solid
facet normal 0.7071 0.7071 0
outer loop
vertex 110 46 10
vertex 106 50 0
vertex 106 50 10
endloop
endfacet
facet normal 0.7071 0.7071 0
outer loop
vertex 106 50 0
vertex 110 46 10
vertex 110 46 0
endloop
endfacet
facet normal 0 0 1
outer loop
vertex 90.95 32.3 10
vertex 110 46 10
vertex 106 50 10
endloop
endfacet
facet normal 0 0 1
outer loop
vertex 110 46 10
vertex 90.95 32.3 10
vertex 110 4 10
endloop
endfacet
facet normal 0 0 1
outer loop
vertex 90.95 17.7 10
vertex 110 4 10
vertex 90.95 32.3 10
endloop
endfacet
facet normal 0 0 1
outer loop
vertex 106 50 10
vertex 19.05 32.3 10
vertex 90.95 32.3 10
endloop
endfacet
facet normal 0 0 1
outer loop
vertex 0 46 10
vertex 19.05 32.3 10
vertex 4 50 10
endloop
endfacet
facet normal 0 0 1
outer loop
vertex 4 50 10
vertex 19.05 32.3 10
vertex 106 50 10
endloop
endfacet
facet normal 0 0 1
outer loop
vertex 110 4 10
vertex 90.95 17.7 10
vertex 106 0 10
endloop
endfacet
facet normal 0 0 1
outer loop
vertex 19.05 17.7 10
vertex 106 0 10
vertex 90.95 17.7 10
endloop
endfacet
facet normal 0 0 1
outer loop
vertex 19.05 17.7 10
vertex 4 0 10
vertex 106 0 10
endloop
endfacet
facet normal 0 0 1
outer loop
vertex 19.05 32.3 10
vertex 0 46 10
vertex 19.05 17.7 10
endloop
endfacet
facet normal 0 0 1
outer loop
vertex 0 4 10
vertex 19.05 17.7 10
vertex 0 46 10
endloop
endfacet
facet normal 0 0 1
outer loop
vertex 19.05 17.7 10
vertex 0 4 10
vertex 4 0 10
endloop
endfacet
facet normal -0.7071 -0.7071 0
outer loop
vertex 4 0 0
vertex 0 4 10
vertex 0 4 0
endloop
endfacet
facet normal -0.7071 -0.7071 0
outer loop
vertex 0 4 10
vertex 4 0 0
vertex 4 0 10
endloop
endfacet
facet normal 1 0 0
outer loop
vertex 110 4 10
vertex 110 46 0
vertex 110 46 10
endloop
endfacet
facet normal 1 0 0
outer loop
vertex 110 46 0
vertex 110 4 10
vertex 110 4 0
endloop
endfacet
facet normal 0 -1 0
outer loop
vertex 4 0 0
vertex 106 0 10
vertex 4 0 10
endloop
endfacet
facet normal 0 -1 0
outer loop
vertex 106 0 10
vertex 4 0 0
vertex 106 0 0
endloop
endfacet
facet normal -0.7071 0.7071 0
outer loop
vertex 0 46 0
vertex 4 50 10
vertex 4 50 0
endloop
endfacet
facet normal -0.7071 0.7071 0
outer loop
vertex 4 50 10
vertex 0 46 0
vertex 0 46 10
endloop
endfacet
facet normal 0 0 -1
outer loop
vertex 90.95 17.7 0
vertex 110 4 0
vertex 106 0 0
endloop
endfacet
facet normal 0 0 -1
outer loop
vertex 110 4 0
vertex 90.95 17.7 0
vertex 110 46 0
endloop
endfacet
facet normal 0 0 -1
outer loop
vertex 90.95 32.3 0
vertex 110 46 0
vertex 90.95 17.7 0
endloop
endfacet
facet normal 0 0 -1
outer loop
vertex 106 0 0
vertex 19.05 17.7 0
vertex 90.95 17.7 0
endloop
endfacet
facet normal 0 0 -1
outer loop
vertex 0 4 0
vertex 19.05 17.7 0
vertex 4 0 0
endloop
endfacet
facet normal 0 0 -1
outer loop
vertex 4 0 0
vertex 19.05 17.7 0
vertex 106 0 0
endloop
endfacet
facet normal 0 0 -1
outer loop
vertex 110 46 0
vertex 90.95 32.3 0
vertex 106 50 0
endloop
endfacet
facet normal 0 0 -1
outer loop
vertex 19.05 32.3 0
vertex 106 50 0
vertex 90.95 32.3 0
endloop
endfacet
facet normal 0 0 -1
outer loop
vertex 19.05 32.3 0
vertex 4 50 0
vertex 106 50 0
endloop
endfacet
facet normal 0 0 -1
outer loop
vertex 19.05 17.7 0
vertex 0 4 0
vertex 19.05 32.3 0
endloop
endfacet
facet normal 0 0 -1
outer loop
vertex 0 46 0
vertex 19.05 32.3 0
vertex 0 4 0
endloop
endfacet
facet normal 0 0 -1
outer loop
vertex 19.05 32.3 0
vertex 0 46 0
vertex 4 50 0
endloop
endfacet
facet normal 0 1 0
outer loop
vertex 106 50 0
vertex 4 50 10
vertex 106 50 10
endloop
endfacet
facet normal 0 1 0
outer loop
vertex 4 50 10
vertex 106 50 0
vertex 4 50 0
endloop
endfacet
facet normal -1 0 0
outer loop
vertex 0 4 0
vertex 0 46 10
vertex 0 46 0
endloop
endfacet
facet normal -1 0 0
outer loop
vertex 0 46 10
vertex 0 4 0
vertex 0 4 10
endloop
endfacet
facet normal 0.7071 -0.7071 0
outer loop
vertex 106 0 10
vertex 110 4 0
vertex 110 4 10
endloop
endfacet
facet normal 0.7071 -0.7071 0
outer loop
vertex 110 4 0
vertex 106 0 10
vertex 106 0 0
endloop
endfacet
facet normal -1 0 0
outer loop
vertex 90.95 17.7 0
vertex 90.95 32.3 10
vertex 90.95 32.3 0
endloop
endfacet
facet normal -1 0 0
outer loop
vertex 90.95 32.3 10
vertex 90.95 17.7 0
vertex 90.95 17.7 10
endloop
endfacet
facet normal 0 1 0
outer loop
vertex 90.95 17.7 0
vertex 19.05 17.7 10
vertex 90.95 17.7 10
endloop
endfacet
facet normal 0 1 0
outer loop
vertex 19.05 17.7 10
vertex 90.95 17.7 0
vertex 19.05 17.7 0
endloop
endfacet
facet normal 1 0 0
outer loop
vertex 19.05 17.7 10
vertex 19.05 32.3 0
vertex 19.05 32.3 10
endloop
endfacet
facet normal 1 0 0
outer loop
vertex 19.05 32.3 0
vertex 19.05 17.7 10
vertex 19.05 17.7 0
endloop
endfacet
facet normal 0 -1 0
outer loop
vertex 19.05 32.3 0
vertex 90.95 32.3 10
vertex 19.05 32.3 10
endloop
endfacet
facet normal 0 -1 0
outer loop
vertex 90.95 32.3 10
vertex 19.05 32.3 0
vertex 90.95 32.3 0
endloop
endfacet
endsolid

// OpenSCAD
$fn = 32;

// ----------------------------------------------------------------------
// Windowed plate: 1 voids, 110 x 50 x 10 mm
// ----------------------------------------------------------------------

// --- parameters (mm) ---
plate_l = 110;            // plate length, X
plate_w = 50;             // plate width, Y
plate_t = 10;             // plate thickness, Z
edge_margin = 12;         // wall from the plate edge to any window
win1_l = 71.9;            // window length
win1_w = 14.6;            // window width
depth_1 = 10;             // depth of void 1 (full thickness = through)
corner_c = 4;             // corner chamfer of the plate

profile = [[4, 0], [106, 0], [110, 4], [110, 46], [106, 50], [4, 50], [0, 46], [0, 4]];  // primary outline, 8 points, counter clockwise
void_1 = [[19.05, 17.7], [90.95, 17.7], [90.95, 32.3], [19.05, 32.3]];  // large central window, 4 points

// --- the one profile operation ---
difference() {
  linear_extrude(height = plate_t) polygon(points = profile);
  translate([0, 0, -1])
    linear_extrude(height = plate_t + 2) polygon(points = void_1);
}
